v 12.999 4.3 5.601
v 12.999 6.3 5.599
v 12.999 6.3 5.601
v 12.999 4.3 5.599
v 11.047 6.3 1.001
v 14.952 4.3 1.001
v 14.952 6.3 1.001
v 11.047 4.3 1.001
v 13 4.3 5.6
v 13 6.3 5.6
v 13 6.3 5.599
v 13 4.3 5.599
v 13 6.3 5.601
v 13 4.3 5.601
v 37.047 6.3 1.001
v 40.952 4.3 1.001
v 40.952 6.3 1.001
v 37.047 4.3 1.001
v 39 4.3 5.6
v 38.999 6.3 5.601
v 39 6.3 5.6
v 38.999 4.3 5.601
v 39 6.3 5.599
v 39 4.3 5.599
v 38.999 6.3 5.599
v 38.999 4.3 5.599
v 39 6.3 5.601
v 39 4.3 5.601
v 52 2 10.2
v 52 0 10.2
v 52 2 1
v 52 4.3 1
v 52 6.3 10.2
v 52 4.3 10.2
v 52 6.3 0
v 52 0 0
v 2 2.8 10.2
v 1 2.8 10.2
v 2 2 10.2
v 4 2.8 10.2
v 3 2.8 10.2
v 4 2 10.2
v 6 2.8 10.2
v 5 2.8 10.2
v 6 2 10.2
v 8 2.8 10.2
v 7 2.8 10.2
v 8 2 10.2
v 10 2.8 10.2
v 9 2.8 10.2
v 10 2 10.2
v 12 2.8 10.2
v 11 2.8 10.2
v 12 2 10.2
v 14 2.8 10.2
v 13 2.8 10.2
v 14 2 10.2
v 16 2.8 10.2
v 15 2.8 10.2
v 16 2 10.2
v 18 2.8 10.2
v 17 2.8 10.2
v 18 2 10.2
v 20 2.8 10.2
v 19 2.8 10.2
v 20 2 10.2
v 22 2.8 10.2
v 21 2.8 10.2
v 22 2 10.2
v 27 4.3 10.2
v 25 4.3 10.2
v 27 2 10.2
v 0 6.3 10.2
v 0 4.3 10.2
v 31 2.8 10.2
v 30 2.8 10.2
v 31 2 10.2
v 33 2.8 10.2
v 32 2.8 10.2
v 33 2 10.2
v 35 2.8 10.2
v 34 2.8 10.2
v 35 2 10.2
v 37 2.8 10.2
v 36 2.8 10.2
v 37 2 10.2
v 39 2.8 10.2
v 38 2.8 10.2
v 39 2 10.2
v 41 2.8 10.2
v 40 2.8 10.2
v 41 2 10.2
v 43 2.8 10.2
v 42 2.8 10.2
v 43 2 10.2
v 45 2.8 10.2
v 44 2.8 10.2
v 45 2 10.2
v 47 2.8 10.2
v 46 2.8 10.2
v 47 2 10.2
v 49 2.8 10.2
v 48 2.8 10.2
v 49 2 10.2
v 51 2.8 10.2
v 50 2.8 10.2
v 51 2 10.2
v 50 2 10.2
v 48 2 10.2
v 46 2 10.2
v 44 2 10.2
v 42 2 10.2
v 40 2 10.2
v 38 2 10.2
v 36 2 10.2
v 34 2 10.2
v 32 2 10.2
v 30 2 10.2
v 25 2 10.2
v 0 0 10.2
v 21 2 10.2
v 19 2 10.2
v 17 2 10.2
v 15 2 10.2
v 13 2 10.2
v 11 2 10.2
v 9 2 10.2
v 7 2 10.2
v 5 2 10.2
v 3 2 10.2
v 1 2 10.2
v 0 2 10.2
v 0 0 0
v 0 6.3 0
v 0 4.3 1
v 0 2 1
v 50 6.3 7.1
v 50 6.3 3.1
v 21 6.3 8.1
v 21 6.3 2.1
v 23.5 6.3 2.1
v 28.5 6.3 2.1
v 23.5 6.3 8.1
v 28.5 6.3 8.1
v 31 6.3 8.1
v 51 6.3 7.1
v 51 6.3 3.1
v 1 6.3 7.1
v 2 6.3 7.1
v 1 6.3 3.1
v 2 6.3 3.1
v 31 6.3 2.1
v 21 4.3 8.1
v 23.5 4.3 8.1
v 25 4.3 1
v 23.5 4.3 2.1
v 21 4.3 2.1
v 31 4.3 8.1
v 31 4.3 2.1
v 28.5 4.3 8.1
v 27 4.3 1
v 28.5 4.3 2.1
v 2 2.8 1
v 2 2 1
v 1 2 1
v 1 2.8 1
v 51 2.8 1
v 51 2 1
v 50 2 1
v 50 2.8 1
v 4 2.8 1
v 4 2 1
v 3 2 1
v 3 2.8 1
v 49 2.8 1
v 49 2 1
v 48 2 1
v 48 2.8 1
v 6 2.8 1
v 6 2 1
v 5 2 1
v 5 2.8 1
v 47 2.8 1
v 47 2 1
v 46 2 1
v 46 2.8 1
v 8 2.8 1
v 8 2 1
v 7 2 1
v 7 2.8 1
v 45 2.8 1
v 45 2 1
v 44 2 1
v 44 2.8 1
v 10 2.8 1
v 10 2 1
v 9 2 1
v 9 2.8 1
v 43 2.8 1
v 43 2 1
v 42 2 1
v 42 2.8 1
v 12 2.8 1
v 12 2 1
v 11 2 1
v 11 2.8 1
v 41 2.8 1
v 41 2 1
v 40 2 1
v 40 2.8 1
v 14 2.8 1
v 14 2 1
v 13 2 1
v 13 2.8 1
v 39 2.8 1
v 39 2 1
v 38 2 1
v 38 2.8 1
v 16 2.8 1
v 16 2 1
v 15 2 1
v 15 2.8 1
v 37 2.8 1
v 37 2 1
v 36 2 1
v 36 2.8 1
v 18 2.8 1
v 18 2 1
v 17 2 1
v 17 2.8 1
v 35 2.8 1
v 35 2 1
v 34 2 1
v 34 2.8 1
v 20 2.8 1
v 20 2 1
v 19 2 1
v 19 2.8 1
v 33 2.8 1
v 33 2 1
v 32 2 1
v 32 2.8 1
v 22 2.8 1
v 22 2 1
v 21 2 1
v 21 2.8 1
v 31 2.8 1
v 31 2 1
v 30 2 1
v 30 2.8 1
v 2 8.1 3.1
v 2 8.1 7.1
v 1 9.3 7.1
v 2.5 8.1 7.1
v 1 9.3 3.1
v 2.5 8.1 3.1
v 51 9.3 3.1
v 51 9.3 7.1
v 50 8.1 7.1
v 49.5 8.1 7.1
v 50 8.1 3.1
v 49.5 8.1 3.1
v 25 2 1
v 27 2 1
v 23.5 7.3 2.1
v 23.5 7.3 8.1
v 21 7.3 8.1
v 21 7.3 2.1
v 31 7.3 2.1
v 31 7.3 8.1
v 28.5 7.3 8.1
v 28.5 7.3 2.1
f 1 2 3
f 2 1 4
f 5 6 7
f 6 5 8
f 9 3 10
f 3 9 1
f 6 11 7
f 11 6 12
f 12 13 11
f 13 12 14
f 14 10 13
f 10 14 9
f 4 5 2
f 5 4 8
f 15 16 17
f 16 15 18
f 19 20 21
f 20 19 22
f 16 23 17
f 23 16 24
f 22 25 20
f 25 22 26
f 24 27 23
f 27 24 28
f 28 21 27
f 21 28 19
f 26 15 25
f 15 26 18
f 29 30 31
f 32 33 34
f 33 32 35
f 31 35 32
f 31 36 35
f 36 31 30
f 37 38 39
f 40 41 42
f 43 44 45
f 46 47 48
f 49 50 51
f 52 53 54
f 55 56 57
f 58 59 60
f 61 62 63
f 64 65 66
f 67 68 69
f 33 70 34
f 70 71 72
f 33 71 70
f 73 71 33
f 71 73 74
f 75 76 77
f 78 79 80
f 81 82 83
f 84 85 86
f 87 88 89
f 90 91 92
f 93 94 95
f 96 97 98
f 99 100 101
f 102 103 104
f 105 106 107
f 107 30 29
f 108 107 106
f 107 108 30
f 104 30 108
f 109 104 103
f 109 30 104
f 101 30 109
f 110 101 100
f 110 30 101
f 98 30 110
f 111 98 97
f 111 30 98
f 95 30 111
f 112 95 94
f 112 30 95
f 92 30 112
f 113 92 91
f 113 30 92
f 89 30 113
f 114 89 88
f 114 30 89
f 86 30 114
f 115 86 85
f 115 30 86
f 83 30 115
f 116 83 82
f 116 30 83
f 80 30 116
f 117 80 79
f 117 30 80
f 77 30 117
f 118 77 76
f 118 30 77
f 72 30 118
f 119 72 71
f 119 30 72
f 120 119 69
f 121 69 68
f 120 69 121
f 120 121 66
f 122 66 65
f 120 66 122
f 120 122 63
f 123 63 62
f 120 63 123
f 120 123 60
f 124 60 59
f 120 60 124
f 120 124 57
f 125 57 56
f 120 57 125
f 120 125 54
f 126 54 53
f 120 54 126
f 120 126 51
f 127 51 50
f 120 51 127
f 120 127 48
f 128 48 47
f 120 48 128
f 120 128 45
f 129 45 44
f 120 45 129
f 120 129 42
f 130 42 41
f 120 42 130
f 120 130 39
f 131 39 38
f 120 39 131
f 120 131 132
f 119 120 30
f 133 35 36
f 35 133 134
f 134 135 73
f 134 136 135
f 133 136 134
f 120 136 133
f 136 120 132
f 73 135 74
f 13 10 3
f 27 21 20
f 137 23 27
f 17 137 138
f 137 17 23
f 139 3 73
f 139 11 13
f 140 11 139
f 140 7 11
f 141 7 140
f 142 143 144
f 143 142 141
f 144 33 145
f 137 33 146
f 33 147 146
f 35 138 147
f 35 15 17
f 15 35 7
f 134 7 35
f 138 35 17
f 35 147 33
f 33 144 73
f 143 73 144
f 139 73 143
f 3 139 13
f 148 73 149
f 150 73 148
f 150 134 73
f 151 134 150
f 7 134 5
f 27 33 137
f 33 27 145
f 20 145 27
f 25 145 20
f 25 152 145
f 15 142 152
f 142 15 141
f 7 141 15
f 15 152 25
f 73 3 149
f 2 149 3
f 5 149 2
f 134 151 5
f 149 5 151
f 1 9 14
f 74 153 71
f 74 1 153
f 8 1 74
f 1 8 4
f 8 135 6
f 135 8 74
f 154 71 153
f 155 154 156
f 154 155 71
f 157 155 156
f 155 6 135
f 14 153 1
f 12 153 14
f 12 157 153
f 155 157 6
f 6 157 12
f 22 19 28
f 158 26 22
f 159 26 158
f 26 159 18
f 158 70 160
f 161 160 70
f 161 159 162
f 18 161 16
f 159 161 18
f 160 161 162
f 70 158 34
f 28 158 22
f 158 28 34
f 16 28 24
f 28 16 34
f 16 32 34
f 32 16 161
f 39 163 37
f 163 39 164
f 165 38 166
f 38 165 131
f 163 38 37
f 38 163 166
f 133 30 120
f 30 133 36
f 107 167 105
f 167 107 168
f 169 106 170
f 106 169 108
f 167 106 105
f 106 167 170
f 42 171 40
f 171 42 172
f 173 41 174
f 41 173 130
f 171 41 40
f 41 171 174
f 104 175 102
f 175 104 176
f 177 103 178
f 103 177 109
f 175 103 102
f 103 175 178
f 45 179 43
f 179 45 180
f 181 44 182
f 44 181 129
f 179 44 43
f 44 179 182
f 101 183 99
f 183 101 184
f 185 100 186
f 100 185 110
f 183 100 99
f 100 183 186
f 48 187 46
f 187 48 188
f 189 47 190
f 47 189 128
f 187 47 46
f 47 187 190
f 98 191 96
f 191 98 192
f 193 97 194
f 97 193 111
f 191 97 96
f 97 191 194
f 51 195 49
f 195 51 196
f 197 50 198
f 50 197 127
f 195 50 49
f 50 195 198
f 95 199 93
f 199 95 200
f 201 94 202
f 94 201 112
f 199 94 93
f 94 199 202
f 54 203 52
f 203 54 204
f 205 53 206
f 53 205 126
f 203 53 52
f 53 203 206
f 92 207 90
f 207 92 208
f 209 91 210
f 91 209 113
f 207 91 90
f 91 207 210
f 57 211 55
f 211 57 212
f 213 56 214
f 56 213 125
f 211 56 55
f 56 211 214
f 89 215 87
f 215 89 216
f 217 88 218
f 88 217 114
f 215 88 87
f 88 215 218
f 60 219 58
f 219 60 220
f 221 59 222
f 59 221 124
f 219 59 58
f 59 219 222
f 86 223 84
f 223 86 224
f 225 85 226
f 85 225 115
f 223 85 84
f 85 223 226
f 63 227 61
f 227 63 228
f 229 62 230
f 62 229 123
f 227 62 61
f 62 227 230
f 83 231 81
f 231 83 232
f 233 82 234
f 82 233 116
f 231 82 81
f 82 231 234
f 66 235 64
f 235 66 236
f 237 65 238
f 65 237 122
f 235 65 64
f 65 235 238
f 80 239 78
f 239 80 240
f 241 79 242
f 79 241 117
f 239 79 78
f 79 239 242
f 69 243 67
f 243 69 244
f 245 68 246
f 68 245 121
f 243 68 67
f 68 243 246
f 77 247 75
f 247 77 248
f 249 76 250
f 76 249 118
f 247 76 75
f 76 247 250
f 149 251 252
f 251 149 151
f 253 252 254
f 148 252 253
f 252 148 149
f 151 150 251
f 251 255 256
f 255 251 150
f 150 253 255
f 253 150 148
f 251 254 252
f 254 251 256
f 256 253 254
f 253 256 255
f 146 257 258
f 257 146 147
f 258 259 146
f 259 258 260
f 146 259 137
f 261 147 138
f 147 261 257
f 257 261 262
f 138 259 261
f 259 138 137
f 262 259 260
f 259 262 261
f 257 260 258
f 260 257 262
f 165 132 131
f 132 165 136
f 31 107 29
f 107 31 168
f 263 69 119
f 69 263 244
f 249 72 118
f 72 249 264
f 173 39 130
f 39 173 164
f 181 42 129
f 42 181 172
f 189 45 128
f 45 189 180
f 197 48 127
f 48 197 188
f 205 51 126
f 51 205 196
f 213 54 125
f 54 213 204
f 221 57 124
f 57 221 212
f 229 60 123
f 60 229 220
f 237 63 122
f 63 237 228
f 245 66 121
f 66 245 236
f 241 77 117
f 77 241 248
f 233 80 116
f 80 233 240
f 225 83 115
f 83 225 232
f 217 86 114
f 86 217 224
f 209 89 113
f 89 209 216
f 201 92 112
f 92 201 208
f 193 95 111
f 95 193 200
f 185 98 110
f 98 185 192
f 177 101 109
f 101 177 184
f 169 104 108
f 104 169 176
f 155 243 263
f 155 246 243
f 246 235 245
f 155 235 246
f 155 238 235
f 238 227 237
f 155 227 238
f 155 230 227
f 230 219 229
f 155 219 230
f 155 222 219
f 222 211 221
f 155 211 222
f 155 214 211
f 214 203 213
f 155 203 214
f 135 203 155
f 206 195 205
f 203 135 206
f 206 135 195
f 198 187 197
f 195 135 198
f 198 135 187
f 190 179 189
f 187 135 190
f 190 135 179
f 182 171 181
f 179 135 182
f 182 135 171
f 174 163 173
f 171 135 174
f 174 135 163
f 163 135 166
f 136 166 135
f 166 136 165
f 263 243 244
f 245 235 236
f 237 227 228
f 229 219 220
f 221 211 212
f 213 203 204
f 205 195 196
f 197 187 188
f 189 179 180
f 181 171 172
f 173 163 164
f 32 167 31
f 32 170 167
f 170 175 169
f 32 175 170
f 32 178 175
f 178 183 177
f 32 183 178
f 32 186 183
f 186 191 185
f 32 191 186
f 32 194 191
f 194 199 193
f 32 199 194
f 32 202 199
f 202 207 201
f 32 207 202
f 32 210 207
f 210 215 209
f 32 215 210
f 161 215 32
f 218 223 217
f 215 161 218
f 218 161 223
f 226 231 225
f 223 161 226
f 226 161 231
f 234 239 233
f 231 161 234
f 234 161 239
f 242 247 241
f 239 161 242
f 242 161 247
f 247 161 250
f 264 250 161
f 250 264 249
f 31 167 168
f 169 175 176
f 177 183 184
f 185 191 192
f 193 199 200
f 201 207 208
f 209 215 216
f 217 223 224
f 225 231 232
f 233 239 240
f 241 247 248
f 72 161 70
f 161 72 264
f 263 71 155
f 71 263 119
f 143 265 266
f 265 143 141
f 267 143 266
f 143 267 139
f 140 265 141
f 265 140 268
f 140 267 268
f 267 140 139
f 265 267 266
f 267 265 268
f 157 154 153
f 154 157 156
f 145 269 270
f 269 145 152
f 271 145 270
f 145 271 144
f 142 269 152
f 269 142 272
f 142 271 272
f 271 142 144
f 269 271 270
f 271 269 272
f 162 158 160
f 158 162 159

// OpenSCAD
gap = 2.3;
wallThick = 2.0;
clampWidth = 52;
clampHeight = 10.2;
teethDepth = 0.8;

module triangleR(size) {
    polyhedron(
        points = [ [0,0,0], [size[0], 0, 0], [0, size[1], 0], [0,0,size[2]], [size[0], 0, size[2]], [0,size[1],size[2]] ],
        faces = [ [0,1,2], [3,5,4], [0,3,1], [3,4,1], [1,4,2], [4,5,2], [2,5,0], [5,3,0] ]
    );
}

cube([clampWidth,wallThick,clampHeight]);

translate([0,wallThick+gap,0]) {
    difference() {
        cube([clampWidth,wallThick,clampHeight]);
        translate([clampWidth/4, -1+wallThick+2 ,1.001]) {
            translate([-0.001,0,0]) {
                rotate([90,0,0]) {
                    triangleR([(clampHeight-1.0)/2/tan(67),(clampHeight-1.0)/2,wallThick+2]);
                }
            }
            mirror([1,0,0]) {
                rotate([90,0,0]) {
                    triangleR([(clampHeight-1.0)/2/tan(67),(clampHeight-1.0)/2,wallThick+2]);
                }
            }
        }
        translate([clampWidth*3/4, -1+wallThick+2 ,1.001]) {
            translate([-0.001,0,0]) {
                rotate([90,0,0]) {
                    triangleR([(clampHeight-1.0)/2/tan(67),(clampHeight-1.0)/2,wallThick+2]);
                }
            }
            mirror([1,0,0]) {
                rotate([90,0,0]) {
                    triangleR([(clampHeight-1.0)/2/tan(67),(clampHeight-1.0)/2,wallThick+2]);
                }
            }
        }
    }
}

cube([clampWidth,wallThick*2+gap,1.0]);

translate([clampWidth/2-wallThick/2,0,0]) {
    cube([wallThick, wallThick*2+gap, clampHeight]);
}

for ( i = [ 1 : 2 : 21 ] ) {
    translate([i,0,0]) {
        cube([1.0, wallThick+teethDepth, clampHeight]);
    }
    translate([clampWidth-i-1,0,0]) {
        cube([1.0, wallThick+teethDepth, clampHeight]);
    }
}

translate([1.0, wallThick+gap, clampHeight/2.0-4.0/2.0]) {
    cube([1.0,3.0-1.2+wallThick,4.0]);
    translate([0,wallThick+1.8,0]) {
        triangleR([1.5, 1.2, 4.0]);
    }
    
}

translate([clampWidth-1.0-1.0, wallThick+gap, clampHeight/2.0-4.0/2.0]) {
    cube([1.0,3.0-1.2+wallThick,4.0]);
    translate([1.0,wallThick+1.8,0]) {
        mirror([1,0,0]) {
            triangleR([1.5, 1.2, 4.0]);
        }
    }
}

translate([clampWidth/2-10/2, wallThick+gap, clampHeight/2.0-6/2.0]) {
    cube([2.5, wallThick+1.0, 6]);
}

translate([clampWidth/2+10/2-2.5, wallThick+gap, clampHeight/2.0-6/2.0]) {
    cube([2.5, wallThick+1.0, 6]);
}
